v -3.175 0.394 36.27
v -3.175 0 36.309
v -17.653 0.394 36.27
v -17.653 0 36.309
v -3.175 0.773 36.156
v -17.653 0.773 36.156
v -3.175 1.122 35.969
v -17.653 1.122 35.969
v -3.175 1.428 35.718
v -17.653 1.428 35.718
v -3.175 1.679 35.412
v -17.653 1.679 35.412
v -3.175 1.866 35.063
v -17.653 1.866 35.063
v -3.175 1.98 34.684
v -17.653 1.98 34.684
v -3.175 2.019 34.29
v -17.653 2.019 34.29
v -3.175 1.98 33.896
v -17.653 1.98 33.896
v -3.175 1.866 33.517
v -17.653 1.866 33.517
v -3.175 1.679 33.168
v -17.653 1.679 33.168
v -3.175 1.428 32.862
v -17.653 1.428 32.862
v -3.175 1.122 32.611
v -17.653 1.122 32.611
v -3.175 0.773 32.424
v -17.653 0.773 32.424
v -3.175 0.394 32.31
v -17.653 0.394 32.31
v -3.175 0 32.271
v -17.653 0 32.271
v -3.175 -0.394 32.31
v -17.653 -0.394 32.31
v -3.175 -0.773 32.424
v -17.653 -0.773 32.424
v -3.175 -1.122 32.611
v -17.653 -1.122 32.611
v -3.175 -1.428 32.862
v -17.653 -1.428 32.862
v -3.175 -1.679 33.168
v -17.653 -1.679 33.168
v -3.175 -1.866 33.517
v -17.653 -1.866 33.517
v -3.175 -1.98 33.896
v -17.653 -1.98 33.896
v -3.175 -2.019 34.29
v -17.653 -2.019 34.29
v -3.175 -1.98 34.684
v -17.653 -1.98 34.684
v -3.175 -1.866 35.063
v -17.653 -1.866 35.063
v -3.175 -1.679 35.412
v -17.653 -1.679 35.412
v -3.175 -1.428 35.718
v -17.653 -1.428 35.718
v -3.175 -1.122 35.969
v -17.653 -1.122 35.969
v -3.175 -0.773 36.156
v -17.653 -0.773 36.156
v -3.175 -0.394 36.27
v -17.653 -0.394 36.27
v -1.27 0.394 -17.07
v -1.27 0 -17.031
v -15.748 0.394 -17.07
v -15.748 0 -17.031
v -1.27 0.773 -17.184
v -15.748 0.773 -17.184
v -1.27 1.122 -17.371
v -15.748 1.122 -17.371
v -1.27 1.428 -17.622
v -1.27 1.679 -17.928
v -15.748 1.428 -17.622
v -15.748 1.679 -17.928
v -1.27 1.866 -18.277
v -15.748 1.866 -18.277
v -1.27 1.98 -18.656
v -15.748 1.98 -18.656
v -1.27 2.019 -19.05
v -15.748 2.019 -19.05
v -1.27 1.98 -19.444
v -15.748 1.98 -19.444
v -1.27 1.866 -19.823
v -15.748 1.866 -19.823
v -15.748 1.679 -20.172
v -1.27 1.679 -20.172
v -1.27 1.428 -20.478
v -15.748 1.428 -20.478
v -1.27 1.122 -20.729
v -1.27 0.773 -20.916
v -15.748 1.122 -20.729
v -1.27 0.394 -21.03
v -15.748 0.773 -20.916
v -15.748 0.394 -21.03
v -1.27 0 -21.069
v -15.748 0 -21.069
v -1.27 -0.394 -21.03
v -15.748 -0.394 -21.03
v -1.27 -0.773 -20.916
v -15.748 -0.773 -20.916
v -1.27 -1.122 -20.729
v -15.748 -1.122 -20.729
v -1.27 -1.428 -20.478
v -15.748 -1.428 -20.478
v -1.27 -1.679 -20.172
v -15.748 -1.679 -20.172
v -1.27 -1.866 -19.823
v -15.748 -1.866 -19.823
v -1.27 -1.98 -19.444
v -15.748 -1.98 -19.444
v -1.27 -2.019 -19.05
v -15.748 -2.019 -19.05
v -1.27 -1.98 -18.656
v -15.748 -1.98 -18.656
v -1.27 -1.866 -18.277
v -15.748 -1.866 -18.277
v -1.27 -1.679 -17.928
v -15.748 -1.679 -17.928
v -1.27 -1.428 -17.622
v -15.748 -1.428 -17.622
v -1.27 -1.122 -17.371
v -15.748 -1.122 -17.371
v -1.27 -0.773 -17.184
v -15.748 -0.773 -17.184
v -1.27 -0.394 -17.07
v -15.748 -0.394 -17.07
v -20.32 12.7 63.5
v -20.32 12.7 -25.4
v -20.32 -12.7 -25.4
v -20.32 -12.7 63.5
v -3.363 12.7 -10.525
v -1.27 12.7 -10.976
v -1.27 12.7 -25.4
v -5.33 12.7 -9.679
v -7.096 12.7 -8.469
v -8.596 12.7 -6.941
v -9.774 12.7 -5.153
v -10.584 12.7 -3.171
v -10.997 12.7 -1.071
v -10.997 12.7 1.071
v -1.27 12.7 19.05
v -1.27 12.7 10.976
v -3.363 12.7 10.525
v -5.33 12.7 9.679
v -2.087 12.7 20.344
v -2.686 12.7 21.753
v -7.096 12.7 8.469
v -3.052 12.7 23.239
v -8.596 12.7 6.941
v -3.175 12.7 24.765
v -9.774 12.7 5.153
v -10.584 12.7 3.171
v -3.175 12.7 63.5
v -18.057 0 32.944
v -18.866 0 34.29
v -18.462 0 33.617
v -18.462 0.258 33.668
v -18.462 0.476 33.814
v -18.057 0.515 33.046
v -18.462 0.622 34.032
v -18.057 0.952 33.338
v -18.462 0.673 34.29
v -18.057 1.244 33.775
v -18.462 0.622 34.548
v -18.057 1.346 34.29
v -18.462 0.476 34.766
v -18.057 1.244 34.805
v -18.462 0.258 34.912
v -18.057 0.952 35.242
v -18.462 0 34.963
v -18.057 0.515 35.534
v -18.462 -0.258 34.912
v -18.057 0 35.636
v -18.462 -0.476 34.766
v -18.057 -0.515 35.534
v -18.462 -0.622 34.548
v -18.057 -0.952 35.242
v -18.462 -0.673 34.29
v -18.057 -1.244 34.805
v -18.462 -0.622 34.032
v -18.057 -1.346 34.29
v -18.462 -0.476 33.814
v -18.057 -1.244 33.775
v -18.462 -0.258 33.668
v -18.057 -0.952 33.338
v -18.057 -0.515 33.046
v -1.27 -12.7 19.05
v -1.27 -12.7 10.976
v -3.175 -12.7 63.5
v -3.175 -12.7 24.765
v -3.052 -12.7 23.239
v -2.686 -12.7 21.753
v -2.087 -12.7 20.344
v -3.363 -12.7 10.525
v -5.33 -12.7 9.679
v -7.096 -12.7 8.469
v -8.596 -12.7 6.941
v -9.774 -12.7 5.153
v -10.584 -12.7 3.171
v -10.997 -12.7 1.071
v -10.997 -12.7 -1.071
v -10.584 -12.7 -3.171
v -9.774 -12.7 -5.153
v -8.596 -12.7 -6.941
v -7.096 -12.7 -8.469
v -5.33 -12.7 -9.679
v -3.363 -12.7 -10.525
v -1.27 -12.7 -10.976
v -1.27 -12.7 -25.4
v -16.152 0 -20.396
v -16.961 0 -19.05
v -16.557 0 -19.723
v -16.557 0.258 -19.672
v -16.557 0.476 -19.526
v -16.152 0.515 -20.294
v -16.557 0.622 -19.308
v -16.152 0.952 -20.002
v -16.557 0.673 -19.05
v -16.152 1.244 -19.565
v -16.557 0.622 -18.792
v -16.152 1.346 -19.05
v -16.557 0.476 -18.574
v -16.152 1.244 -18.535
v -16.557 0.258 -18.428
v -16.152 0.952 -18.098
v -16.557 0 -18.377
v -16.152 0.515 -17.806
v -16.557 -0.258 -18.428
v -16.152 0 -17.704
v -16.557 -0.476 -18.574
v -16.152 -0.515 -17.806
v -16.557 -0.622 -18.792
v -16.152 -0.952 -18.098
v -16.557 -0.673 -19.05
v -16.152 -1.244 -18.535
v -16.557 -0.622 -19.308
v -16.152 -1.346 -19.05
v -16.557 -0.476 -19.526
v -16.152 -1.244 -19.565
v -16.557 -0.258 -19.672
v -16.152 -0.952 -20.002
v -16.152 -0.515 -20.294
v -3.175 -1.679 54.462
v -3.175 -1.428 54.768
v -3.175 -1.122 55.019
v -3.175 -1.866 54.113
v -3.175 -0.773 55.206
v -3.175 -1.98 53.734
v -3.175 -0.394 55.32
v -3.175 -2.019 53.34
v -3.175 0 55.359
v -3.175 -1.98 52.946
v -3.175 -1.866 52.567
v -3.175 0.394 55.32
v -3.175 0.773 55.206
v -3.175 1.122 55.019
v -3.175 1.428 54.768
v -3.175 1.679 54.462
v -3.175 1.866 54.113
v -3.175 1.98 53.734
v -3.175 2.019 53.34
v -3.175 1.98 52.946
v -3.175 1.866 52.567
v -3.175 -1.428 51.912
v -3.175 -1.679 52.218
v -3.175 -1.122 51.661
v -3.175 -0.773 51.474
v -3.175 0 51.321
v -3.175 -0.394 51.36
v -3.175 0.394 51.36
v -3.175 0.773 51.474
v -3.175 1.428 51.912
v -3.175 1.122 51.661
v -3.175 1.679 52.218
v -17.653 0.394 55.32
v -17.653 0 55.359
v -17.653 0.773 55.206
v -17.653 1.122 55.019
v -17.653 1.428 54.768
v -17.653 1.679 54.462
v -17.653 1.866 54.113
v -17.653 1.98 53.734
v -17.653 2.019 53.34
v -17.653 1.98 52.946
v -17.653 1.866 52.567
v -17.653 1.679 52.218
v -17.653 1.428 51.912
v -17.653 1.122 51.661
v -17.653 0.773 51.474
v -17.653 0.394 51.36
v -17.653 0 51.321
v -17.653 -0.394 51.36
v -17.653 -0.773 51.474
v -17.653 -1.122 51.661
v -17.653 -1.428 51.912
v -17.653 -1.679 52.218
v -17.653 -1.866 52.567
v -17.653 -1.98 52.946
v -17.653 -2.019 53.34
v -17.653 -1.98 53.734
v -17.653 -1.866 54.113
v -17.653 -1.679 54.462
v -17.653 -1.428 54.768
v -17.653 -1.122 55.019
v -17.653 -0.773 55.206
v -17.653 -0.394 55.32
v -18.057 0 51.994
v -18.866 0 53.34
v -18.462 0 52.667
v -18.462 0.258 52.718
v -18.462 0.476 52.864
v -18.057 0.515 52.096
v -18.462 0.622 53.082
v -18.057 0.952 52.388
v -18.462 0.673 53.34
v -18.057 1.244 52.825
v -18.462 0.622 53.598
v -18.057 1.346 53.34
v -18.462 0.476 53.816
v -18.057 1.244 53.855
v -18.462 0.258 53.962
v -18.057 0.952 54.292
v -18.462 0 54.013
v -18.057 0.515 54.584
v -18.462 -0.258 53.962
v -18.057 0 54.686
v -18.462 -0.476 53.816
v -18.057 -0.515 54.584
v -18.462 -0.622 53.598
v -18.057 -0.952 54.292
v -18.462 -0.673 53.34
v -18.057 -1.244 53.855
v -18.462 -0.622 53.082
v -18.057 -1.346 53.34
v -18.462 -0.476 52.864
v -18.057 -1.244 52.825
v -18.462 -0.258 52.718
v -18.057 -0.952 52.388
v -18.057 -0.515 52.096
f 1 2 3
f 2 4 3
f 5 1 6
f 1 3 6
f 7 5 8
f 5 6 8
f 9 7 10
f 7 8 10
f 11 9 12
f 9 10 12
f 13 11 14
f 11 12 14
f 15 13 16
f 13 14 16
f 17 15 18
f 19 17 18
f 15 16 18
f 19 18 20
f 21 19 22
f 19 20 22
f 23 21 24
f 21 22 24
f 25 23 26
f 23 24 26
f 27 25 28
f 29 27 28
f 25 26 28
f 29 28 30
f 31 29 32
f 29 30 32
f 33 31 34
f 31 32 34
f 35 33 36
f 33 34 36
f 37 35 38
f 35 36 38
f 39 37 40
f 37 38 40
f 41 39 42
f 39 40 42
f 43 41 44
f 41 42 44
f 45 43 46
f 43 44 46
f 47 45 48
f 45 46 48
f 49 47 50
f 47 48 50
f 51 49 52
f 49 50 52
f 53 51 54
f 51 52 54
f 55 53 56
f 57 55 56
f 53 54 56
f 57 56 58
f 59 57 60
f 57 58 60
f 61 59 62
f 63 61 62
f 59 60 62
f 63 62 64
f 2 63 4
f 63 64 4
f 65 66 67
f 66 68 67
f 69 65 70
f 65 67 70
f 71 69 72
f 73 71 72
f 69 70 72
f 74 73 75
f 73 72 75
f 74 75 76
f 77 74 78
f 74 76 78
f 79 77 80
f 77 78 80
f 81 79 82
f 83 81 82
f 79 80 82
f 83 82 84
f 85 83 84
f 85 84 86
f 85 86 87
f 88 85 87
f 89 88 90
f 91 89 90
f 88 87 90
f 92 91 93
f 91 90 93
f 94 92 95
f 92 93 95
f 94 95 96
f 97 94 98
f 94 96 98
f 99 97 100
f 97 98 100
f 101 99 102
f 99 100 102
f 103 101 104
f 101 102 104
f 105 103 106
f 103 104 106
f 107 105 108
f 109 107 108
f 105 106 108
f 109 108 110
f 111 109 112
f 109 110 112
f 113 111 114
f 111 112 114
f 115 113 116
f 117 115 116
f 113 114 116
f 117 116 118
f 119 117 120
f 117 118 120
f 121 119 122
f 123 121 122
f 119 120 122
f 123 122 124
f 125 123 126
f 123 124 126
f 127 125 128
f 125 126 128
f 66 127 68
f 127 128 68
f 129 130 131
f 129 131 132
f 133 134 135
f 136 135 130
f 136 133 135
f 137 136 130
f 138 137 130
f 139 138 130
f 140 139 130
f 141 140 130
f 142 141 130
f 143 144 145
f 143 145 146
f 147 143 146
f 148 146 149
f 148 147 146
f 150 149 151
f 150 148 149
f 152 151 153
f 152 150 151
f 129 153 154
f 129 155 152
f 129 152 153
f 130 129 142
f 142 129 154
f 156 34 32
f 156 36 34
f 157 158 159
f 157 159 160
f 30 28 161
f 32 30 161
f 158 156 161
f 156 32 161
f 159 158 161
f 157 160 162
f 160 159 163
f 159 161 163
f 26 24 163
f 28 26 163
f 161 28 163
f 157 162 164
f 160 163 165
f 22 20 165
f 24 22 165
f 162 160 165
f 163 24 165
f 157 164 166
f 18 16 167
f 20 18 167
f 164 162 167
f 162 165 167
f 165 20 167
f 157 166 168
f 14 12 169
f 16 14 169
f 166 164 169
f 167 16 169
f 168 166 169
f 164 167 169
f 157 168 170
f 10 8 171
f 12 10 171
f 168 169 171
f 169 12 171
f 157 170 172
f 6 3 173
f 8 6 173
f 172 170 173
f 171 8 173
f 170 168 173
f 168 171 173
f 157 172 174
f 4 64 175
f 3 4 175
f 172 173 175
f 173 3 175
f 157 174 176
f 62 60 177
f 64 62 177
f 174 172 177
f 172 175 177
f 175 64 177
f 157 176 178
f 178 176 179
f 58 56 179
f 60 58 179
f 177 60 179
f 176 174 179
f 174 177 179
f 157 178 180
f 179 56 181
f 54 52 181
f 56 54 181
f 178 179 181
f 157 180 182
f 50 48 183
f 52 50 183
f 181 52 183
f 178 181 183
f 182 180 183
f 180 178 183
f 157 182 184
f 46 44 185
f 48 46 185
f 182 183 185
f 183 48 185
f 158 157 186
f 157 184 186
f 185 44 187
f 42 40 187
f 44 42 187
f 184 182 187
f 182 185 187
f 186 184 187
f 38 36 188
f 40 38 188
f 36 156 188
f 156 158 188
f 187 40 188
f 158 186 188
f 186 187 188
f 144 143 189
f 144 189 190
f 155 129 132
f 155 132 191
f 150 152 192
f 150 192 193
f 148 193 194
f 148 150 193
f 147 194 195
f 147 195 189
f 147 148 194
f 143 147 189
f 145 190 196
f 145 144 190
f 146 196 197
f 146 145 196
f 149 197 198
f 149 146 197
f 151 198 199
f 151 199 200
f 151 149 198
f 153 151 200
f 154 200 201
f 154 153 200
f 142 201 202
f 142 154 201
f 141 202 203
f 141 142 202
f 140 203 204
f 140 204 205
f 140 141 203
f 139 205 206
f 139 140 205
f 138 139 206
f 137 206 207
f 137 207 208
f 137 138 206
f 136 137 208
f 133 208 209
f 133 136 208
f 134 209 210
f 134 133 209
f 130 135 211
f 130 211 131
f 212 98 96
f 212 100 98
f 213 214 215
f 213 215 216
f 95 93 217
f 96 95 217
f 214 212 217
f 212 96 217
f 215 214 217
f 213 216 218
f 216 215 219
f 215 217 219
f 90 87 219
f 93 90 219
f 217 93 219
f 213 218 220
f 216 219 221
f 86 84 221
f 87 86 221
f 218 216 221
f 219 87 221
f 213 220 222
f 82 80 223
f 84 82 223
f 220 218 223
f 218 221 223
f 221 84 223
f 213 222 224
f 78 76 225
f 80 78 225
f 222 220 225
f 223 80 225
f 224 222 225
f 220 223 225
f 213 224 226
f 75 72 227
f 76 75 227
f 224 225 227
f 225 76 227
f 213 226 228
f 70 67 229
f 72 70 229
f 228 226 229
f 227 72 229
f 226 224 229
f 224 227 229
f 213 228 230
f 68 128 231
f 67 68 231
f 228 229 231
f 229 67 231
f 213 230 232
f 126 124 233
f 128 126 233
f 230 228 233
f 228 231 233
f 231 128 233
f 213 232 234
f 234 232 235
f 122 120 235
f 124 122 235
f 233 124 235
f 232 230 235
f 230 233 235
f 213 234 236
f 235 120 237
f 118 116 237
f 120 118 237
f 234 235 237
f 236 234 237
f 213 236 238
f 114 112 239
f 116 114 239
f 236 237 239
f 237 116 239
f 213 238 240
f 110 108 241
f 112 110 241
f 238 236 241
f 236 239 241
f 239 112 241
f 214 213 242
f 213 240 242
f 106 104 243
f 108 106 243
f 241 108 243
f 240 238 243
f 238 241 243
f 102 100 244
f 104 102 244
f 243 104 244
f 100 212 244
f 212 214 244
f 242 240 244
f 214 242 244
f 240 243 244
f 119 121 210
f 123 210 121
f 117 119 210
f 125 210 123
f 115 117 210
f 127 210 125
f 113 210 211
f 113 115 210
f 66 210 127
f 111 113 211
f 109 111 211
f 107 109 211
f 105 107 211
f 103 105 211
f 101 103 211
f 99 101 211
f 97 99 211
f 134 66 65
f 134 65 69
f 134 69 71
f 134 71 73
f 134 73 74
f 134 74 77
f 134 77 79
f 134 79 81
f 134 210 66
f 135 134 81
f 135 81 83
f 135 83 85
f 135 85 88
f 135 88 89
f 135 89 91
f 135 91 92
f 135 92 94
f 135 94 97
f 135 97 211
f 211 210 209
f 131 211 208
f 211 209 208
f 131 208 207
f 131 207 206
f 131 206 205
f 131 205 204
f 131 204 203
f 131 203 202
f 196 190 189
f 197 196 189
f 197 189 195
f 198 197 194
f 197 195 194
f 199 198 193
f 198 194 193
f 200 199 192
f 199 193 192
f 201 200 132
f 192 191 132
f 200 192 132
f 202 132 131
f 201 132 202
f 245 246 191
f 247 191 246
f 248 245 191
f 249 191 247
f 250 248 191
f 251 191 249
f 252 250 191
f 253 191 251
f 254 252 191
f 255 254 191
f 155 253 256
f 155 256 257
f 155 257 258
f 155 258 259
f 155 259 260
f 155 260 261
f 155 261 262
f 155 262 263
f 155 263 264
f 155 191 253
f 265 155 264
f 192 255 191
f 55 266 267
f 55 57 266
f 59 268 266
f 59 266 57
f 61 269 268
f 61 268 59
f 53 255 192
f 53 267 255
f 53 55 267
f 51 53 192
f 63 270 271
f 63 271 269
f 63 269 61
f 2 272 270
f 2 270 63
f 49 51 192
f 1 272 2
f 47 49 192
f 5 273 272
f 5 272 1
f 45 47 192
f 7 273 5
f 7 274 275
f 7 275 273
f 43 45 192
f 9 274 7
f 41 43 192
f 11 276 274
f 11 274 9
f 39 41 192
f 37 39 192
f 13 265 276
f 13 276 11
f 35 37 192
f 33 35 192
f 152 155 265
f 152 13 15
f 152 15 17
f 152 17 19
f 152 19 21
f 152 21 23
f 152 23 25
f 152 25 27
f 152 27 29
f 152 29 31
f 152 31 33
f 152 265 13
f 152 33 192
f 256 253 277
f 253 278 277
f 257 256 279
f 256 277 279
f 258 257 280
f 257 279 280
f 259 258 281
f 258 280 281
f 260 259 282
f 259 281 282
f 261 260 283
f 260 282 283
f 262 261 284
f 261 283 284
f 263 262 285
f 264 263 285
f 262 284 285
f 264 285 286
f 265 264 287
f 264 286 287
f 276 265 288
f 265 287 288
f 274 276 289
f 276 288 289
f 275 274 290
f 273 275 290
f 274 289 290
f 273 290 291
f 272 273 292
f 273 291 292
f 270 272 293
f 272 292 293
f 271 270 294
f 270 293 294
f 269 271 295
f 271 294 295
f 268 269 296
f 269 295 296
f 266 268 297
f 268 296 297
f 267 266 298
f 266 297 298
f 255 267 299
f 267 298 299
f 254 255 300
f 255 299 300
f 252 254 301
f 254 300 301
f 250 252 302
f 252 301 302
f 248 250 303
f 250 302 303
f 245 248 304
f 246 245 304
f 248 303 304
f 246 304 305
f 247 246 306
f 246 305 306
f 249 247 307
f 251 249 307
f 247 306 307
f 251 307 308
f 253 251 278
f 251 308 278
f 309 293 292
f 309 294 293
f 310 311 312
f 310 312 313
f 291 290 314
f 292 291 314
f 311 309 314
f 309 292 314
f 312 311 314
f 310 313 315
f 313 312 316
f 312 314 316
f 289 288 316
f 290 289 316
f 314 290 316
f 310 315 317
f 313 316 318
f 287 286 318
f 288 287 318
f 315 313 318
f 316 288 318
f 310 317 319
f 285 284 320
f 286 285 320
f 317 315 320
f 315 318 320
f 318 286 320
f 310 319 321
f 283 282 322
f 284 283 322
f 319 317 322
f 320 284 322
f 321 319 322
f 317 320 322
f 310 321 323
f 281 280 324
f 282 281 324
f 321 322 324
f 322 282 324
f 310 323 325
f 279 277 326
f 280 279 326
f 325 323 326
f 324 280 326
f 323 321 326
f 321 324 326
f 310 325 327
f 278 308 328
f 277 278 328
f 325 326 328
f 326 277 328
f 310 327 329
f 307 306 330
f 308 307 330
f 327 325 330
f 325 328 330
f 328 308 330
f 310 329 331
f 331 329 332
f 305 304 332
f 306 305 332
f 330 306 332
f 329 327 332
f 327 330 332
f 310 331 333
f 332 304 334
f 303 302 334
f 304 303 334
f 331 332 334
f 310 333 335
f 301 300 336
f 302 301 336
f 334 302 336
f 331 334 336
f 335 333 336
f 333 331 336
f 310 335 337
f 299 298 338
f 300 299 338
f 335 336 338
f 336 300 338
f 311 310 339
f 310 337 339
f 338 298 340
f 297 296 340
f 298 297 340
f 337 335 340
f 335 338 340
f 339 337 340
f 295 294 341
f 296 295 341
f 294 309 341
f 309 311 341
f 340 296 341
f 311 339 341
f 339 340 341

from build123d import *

# Parameters (mm, degrees)
BOSS_EXTRUDE1_DEPTH        = 12.7
SKETCH7_W                  = 1.905
SKETCH7_H                  = 44.45
CUT_EXTRUDE1_DEPTH         = 72.346425278
FILLET1_R                  = 9.525
F_10_32_TAPPED_HOLE1_D     = 4.0386
F_10_32_TAPPED_HOLE1_DEPTH = 14.478
F_10_32_TAPPED_HOLE1_TIP   = 1.213317848
F_10_32_TAPPED_HOLE2_D     = 4.0386
F_10_32_TAPPED_HOLE2_DEPTH = 14.478
F_10_32_TAPPED_HOLE2_TIP   = 1.213317848


with BuildPart() as part:
    # Sketch1 → Boss-Extrude1 (new, symmetric)
    with BuildSketch(Plane(origin=(0, 0, 0), x_dir=(1, 0, 0), z_dir=(0, 1, 0))):
        with BuildLine():
            Line((-1.27, 10.975768811), (-1.27, 25.4))
            Line((-1.27, 25.4), (-20.32, 25.4))
            Line((-20.32, 25.4), (-20.32, -63.5))
            Line((-20.32, -63.5), (-1.27, -63.5))
            Line((-1.27, -63.5), (-1.27, -10.975768811))
            ThreePointArc((-1.27, -10.975768811), (-11.049, 0), (-1.27, 10.975768811))
        make_face()
    extrude(amount=BOSS_EXTRUDE1_DEPTH, both=True)

    # Sketch7 → Cut-Extrude1 (cut, through all)
    with BuildSketch(Plane(origin=(0, 12.7, 0), x_dir=(1, 0, 0), z_dir=(0, 1, 0))):
        with Locations((-2.2225, -41.275)):
            Rectangle(SKETCH7_W, SKETCH7_H)
    extrude(amount=-CUT_EXTRUDE1_DEPTH, mode=Mode.SUBTRACT)

    # Fillet1
    # the kernel refuses this fillet: 9.525 mm, written as the material it adds along each edge
    with BuildSketch(Plane(origin=(-3.175, 12.7, 19.05), x_dir=(1, 0, 0), z_dir=(0, -1, 0))) as fillet1_piece_1:
        with BuildLine():
            CenterArc((9.525, 5.715), FILLET1_R, 180, 36.869897646)
            Line((0, 5.715), (-0.1905, 5.715))
            Line((-0.1905, 5.715), (-0.1905, 0))
            Line((-0.1905, 0), (0, -0.1905))
            ThreePointArc((0, -0.1905), (0.9525, -0.1905), (1.7526, -0.1143))
            Line((1.7526, -0.1143), (1.905, 0))
        make_face()
    extrude(amount=25.4)

    # #10-32 Tapped Hole1
    with Locations(Plane(origin=(-3.175, 0, 0), x_dir=(0, 0, -1), z_dir=(1, 0, 0))):
        with Locations((-53.34, 0), (-34.29, 0)):
            Hole(F_10_32_TAPPED_HOLE1_D / 2, depth=F_10_32_TAPPED_HOLE1_DEPTH)
            with Locations((0, 0, -(F_10_32_TAPPED_HOLE1_DEPTH + F_10_32_TAPPED_HOLE1_TIP / 2))):  # 118° drill point
                Cone(0, F_10_32_TAPPED_HOLE1_D / 2, F_10_32_TAPPED_HOLE1_TIP, mode=Mode.SUBTRACT)

    # #10-32 Tapped Hole2
    with Locations(Plane(origin=(-1.27, 0, 0), x_dir=(0, 0, -1), z_dir=(1, 0, 0))):
        with Locations((19.05, 0)):
            Hole(F_10_32_TAPPED_HOLE2_D / 2, depth=F_10_32_TAPPED_HOLE2_DEPTH)
            with Locations((0, 0, -(F_10_32_TAPPED_HOLE2_DEPTH + F_10_32_TAPPED_HOLE2_TIP / 2))):  # 118° drill point
                Cone(0, F_10_32_TAPPED_HOLE2_D / 2, F_10_32_TAPPED_HOLE2_TIP, mode=Mode.SUBTRACT)


solid = part.part
